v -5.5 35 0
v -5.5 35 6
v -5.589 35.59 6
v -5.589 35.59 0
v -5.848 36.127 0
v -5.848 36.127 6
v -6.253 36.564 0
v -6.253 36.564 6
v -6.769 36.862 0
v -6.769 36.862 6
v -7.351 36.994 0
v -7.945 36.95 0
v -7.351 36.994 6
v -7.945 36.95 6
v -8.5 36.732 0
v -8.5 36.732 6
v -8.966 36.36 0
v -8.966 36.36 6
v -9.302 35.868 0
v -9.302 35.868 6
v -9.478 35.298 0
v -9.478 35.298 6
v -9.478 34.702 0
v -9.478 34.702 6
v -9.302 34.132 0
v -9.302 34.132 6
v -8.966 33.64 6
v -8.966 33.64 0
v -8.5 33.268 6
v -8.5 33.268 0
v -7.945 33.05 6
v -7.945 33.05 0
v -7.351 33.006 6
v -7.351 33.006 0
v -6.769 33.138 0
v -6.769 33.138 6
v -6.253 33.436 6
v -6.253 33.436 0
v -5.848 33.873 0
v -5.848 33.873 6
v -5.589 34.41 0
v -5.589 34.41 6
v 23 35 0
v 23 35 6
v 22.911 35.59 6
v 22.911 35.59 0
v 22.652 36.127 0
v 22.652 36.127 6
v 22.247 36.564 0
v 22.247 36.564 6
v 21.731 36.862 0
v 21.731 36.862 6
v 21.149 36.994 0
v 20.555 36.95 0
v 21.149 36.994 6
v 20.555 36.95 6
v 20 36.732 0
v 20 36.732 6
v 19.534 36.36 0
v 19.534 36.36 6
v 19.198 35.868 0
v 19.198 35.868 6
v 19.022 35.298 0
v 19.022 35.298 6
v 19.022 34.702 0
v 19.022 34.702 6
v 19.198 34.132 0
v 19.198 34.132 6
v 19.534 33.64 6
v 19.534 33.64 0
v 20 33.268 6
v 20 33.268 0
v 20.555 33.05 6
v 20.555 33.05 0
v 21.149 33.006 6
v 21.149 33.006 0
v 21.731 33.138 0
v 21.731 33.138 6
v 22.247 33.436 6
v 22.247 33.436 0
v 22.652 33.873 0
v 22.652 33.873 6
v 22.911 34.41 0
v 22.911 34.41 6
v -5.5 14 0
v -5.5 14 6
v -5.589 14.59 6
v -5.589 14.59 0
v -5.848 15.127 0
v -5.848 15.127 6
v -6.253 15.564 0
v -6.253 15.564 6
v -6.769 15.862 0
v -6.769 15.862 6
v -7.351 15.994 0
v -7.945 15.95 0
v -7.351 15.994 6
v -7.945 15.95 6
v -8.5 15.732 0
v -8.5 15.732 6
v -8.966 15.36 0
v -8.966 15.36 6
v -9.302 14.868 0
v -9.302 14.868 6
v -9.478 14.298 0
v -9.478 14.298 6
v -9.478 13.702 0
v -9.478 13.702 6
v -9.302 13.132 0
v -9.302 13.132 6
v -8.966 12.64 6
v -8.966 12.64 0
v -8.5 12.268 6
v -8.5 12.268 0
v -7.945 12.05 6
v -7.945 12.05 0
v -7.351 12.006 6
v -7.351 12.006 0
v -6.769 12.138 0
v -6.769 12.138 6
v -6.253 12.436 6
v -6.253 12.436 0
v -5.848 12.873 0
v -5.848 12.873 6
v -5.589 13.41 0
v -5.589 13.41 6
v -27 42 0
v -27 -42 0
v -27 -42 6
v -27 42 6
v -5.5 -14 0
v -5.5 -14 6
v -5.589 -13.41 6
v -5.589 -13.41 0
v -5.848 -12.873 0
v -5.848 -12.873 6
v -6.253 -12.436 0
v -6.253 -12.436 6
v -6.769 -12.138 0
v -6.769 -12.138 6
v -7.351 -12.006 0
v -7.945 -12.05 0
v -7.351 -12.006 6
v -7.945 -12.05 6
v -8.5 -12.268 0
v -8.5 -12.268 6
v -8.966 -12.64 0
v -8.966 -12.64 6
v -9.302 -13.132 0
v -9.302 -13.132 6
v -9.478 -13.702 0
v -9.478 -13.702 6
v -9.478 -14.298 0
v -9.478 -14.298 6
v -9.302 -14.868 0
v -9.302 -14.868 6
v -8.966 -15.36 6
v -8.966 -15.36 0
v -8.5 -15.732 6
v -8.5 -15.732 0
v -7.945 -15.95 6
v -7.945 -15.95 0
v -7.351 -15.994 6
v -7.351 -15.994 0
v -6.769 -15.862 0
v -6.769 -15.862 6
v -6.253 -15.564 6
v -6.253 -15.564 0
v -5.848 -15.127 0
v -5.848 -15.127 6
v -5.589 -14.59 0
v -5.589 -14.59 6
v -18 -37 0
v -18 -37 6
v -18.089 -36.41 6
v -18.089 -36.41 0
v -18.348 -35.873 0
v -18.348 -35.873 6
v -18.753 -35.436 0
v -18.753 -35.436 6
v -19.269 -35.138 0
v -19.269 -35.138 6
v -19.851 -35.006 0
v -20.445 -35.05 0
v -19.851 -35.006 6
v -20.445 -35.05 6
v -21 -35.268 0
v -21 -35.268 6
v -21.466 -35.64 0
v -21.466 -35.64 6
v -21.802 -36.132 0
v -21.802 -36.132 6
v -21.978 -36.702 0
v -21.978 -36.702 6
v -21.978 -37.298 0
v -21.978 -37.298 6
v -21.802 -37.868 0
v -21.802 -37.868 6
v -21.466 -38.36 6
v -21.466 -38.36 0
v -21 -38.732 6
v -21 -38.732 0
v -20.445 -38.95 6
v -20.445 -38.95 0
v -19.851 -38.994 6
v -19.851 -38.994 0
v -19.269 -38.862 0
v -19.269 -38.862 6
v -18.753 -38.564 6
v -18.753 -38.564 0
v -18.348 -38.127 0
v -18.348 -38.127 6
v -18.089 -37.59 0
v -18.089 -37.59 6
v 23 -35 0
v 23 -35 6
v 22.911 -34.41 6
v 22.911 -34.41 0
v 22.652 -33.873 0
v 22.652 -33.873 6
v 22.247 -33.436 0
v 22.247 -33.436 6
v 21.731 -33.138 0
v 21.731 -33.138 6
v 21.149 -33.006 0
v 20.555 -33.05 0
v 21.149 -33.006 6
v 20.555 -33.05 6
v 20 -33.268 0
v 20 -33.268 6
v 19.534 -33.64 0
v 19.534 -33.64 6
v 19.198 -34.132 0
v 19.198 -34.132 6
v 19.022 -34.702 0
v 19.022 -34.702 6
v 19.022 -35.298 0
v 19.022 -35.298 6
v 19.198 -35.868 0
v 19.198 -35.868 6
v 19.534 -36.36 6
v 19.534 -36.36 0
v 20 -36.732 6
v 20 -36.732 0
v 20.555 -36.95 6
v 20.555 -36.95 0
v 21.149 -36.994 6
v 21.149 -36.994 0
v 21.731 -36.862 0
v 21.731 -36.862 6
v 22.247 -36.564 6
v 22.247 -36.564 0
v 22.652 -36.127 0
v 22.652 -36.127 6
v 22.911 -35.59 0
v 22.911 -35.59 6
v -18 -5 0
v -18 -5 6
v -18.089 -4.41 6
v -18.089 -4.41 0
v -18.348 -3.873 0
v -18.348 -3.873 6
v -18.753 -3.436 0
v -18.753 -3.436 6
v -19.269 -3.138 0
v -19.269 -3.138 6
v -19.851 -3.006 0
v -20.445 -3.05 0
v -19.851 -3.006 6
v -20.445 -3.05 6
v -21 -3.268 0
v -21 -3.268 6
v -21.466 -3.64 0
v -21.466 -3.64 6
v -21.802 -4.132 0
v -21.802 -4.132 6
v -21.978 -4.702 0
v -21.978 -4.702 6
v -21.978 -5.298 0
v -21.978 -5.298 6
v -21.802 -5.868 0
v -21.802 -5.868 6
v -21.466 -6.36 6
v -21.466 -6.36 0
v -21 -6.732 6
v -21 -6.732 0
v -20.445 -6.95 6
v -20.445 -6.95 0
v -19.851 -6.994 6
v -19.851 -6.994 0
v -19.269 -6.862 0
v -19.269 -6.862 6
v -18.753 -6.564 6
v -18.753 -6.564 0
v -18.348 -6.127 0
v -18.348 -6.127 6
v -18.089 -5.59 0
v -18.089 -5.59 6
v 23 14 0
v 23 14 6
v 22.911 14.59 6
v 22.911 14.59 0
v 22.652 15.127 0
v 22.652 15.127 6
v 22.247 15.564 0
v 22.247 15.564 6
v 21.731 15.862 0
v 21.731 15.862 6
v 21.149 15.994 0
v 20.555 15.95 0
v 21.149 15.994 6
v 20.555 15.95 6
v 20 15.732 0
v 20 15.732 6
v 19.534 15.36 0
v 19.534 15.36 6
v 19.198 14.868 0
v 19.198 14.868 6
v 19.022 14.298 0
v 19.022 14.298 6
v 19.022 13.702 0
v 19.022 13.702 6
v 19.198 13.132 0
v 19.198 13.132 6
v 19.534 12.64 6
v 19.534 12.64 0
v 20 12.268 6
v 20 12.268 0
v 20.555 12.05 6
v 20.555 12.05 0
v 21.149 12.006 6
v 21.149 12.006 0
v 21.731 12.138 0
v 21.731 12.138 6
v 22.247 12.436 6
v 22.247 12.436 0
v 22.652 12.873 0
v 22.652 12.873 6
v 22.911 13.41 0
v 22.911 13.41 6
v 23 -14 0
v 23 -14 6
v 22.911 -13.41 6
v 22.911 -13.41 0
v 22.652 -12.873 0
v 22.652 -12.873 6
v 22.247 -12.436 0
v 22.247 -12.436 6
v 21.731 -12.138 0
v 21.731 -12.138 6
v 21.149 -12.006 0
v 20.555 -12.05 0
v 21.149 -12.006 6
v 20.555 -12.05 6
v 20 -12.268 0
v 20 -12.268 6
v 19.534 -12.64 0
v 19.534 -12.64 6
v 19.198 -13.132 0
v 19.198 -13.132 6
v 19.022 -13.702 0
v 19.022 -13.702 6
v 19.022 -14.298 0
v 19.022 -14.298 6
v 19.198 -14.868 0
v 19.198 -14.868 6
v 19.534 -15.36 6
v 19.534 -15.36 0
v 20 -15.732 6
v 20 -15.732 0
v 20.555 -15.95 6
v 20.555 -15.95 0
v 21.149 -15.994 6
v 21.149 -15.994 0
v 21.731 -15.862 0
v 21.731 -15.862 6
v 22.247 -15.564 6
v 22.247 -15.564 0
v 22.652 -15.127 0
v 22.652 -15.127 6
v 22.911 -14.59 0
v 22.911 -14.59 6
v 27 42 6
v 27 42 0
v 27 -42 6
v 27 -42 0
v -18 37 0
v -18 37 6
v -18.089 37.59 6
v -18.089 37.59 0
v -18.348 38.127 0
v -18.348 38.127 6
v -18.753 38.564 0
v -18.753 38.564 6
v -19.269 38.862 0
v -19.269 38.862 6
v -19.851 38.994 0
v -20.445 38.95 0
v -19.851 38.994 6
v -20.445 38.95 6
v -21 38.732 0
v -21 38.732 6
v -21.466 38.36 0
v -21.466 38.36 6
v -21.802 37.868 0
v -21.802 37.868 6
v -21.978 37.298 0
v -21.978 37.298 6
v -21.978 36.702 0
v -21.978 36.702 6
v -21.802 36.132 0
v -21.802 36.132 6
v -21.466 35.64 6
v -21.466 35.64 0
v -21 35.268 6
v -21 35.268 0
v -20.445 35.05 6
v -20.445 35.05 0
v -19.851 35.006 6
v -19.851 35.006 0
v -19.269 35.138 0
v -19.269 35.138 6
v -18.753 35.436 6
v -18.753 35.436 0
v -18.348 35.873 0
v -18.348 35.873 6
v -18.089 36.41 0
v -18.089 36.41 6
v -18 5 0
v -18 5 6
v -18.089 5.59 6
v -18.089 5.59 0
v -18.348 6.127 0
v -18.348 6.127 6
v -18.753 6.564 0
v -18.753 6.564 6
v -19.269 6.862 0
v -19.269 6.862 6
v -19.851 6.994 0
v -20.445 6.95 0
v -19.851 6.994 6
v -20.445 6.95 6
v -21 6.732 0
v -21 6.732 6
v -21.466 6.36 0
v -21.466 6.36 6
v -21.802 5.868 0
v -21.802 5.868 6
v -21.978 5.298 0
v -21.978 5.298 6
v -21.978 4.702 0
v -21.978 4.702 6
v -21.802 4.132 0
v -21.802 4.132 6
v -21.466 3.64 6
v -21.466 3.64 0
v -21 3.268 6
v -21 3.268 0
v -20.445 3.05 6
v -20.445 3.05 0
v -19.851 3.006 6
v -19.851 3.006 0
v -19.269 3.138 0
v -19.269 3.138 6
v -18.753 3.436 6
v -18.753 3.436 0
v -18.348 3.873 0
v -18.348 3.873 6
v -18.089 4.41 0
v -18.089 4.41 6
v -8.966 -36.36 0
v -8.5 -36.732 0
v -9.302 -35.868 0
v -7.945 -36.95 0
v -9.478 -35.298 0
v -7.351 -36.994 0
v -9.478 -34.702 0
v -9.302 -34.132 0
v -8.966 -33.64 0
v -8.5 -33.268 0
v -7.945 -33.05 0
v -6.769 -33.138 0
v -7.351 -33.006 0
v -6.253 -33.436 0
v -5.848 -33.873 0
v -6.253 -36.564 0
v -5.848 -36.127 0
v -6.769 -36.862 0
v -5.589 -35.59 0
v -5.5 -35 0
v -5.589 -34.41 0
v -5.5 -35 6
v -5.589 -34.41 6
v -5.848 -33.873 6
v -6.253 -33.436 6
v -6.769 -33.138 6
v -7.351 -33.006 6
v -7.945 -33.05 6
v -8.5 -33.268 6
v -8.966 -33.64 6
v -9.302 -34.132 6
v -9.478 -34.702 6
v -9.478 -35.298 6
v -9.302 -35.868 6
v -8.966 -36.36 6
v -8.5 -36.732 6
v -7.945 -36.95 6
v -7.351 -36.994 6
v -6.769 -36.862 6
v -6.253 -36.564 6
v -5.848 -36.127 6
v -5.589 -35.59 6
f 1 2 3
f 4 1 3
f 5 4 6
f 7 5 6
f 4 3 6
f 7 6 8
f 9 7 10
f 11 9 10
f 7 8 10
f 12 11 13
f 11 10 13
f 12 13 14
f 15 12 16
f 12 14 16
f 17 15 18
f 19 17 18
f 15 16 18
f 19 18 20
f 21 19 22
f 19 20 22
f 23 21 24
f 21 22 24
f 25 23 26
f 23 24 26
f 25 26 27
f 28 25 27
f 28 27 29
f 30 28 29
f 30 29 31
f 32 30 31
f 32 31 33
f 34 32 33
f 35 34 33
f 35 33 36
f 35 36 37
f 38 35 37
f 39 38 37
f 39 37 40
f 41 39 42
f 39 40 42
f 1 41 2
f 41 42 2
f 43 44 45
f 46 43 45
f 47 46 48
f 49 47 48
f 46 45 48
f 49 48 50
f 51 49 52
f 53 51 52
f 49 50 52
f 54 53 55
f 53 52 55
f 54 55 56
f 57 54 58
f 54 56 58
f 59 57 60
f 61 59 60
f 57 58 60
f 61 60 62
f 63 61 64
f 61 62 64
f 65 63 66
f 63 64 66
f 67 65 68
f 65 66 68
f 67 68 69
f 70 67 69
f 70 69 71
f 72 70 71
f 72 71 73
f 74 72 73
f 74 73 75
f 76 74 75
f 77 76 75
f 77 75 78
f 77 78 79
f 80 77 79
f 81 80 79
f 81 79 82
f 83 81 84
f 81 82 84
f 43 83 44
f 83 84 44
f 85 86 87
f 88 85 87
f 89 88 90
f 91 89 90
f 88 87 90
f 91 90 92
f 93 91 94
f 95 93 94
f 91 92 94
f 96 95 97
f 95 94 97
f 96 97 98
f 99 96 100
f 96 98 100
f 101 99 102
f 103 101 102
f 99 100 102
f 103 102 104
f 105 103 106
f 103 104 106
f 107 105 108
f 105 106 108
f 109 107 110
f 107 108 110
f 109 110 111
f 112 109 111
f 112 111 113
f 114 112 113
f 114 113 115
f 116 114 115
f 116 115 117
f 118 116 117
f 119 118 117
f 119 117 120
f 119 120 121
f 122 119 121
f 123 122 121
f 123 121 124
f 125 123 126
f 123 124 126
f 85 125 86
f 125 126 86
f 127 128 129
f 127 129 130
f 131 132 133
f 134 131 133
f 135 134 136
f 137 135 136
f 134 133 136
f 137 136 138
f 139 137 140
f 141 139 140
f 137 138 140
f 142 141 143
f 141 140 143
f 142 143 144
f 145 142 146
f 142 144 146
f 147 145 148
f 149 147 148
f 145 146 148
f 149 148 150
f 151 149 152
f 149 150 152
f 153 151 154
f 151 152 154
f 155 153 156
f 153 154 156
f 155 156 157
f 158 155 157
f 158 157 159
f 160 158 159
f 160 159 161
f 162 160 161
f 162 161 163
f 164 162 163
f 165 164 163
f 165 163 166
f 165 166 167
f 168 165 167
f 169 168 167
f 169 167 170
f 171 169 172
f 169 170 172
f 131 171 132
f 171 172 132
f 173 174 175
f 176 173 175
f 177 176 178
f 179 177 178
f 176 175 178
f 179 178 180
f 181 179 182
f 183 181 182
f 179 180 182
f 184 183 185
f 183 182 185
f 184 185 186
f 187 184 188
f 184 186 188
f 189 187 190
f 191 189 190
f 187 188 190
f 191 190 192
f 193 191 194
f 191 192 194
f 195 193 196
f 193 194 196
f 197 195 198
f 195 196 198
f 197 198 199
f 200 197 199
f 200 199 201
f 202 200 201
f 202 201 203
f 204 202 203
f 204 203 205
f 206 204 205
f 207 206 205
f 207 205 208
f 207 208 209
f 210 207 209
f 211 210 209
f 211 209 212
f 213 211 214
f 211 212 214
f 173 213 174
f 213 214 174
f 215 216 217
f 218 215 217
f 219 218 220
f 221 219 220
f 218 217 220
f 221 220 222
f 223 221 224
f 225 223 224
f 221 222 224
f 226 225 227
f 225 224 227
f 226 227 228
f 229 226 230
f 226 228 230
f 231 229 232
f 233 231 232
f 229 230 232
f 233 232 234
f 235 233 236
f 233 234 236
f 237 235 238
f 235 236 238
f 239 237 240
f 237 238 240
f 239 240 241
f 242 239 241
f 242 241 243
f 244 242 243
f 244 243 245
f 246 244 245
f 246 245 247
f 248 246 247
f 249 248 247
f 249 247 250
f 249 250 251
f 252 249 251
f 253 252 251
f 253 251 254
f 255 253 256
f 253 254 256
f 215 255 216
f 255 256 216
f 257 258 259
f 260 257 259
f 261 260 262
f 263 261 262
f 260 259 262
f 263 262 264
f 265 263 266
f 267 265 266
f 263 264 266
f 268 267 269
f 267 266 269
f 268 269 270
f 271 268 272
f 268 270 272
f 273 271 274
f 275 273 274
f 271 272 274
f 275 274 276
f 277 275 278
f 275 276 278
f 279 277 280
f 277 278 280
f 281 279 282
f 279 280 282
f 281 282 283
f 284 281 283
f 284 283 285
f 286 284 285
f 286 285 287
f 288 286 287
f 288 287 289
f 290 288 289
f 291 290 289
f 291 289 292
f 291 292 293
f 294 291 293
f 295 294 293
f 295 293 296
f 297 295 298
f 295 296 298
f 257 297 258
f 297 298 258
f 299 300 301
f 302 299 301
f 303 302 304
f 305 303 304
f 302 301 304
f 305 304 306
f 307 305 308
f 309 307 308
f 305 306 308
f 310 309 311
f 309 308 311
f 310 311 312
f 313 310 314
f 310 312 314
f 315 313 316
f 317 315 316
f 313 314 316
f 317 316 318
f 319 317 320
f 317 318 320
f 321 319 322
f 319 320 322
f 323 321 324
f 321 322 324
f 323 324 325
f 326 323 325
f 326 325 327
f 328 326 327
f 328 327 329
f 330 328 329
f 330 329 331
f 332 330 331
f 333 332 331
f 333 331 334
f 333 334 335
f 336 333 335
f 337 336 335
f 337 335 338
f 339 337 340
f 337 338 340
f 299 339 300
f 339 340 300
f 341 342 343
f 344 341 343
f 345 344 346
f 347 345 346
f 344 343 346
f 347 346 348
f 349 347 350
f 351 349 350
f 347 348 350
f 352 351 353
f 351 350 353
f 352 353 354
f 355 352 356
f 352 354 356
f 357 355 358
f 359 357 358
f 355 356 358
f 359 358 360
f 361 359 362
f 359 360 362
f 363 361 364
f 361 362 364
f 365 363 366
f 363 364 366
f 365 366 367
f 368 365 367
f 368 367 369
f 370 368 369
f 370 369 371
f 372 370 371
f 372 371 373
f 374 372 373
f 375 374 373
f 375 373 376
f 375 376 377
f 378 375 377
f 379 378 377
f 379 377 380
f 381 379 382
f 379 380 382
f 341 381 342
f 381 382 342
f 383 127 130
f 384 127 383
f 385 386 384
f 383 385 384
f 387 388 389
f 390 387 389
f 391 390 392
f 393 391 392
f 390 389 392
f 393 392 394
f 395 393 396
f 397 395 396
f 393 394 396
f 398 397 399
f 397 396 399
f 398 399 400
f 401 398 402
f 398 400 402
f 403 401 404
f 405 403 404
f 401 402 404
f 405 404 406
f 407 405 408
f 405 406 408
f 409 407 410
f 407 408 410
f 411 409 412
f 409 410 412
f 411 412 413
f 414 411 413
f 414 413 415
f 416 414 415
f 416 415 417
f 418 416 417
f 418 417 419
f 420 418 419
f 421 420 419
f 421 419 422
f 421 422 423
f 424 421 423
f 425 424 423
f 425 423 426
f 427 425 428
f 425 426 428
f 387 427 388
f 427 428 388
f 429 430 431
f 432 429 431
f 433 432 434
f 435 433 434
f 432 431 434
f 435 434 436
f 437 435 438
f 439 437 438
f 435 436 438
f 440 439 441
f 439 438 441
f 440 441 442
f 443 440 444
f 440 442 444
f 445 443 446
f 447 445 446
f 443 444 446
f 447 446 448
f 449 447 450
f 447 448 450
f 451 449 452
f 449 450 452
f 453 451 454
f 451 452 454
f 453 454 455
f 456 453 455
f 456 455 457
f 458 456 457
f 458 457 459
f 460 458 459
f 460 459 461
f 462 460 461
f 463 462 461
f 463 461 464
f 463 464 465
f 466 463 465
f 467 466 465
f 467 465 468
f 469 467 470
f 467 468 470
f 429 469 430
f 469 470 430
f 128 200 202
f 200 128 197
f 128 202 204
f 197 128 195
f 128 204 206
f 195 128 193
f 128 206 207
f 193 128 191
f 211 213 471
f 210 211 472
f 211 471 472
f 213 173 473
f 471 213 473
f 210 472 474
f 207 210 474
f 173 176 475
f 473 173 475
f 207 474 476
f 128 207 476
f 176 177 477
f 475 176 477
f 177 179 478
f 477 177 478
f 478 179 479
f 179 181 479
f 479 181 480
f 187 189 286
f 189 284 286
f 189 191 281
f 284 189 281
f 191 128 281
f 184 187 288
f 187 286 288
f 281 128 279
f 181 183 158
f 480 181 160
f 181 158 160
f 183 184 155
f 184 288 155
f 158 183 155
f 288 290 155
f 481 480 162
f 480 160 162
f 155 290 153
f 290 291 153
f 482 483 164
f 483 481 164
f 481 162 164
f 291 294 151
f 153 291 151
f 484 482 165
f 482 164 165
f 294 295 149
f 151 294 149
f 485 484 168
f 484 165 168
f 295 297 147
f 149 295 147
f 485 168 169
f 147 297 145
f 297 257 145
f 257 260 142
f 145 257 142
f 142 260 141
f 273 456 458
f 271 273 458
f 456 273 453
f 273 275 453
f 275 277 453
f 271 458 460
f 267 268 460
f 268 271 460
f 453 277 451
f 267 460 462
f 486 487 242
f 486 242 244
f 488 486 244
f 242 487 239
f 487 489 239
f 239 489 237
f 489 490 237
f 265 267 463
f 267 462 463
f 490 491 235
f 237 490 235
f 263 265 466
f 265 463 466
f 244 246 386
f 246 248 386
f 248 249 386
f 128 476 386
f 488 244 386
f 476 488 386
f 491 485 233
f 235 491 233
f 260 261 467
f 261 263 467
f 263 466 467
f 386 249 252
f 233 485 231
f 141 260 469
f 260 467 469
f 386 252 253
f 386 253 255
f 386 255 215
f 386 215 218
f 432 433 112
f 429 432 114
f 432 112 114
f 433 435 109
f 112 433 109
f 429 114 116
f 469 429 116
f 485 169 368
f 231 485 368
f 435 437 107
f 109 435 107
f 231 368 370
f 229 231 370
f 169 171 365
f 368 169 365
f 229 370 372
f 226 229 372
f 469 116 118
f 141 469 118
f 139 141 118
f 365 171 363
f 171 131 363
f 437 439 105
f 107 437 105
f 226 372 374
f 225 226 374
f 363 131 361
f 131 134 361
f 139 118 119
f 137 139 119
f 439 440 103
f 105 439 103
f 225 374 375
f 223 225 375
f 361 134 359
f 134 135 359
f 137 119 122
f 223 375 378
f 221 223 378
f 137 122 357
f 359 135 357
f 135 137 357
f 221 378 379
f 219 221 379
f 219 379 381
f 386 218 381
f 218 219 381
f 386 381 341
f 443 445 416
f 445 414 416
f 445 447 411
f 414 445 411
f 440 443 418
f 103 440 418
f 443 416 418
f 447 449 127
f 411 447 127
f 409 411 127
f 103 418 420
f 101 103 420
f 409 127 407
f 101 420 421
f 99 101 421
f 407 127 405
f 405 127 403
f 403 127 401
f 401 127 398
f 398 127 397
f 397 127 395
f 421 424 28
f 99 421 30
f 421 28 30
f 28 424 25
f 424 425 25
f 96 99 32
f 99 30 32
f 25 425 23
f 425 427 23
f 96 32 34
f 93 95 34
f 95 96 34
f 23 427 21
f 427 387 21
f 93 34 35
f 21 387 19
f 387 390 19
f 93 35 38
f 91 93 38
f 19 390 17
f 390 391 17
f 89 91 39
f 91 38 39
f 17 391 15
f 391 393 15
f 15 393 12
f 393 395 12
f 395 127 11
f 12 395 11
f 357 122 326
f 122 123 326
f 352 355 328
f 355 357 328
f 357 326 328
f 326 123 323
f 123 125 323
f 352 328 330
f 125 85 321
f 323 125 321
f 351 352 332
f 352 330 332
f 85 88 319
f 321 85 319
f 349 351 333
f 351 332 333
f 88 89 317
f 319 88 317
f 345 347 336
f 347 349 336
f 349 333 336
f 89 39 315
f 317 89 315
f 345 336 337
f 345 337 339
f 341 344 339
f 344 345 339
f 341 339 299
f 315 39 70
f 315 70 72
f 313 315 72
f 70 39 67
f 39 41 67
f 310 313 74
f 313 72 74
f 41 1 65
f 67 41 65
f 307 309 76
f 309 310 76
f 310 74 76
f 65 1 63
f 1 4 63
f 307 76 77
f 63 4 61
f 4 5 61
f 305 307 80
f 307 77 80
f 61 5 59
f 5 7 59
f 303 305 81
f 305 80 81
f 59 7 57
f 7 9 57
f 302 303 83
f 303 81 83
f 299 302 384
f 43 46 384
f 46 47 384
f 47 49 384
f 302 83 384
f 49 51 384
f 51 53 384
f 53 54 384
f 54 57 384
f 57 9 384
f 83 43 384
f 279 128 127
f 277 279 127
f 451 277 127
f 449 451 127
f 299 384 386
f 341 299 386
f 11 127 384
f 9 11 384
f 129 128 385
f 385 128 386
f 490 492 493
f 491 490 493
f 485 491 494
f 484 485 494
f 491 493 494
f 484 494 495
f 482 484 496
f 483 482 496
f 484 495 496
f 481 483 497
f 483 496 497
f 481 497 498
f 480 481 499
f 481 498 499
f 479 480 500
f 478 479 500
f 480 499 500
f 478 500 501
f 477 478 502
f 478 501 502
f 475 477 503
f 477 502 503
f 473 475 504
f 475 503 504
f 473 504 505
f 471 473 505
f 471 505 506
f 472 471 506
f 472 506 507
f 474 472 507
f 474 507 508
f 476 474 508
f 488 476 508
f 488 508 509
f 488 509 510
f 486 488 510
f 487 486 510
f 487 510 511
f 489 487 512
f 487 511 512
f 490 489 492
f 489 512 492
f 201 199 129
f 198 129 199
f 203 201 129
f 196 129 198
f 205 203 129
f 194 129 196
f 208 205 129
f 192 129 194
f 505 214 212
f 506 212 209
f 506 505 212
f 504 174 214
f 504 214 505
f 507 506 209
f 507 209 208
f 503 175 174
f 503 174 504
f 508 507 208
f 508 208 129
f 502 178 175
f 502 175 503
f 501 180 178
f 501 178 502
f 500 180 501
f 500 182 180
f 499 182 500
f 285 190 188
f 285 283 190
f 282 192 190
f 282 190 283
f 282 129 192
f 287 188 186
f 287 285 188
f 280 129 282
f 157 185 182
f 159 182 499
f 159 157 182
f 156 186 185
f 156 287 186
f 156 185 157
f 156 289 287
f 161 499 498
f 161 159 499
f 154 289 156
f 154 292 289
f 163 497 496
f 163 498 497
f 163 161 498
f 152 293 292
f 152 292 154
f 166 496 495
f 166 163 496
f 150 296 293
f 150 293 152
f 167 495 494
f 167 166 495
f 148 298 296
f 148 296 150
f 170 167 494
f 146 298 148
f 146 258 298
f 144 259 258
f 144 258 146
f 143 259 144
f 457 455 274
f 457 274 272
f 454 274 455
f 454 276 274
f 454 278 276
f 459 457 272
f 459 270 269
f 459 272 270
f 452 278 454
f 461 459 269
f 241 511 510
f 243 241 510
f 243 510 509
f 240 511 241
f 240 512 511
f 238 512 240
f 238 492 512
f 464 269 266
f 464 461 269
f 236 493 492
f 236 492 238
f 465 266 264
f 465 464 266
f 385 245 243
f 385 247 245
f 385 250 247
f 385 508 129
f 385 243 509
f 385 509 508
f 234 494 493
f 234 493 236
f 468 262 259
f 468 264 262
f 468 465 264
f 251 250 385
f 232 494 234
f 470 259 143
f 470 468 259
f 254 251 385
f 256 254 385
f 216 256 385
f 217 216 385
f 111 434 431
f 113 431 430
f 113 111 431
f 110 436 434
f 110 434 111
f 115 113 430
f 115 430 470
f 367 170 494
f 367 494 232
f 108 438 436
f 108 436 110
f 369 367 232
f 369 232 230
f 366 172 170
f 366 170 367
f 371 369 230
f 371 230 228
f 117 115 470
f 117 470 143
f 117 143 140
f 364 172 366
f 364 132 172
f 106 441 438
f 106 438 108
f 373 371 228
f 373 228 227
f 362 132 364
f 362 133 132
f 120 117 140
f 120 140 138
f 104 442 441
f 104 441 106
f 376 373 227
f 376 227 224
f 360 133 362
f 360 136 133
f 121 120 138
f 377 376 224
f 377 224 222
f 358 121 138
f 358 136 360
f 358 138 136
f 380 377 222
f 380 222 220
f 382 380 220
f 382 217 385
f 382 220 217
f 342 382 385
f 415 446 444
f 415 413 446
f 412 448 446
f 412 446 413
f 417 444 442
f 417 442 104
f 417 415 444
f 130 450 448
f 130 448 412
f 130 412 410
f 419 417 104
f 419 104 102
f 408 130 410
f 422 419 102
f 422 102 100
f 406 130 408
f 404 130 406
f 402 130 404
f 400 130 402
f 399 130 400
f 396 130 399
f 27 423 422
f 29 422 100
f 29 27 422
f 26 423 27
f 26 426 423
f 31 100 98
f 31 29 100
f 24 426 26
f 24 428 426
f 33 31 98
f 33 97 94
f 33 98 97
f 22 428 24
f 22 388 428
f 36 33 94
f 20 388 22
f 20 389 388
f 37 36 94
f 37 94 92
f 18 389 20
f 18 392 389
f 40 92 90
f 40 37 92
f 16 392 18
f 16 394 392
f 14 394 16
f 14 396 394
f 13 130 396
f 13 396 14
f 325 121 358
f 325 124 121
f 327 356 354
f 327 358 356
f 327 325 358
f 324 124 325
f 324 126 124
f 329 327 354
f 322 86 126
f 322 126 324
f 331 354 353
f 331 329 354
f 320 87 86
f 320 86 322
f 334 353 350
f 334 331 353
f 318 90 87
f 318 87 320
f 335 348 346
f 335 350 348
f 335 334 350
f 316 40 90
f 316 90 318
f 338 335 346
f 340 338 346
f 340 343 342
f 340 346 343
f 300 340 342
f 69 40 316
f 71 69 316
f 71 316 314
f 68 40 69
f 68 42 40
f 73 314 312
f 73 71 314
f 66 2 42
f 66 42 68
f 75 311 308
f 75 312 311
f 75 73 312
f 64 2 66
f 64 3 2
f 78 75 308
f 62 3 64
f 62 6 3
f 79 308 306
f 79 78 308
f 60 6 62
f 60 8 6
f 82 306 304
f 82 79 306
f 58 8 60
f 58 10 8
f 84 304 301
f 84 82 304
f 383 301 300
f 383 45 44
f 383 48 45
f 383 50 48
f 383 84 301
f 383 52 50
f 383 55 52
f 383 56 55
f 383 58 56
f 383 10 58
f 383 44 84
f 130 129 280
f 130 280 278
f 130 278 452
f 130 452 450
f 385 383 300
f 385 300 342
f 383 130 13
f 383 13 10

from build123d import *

# Parameters (mm, degrees)
F0_W     = 54
F0_H     = 84
F1_DEPTH = 6
F3_R     = 2
F4_DEPTH = 6


with BuildPart() as f1:
    # F0 (on Top) → F1 (new body)
    with BuildSketch(Plane.XY):
        Rectangle(F0_W, F0_H)
    extrude(amount=F1_DEPTH)

    # F3 (on face) → F4 (cut, through all)
    with BuildSketch(Plane.XY.offset(6)):
        with Locations((-7.5, 14)):
            Circle(F3_R)
        with Locations((-7.5, -14)):
            Circle(F3_R)
        with Locations((-20, 5)):
            Circle(F3_R)
        with Locations((-20, -5)):
            Circle(F3_R)
        with Locations((21, 14)):
            Circle(F3_R)
        with Locations((21, -14)):
            Circle(F3_R)
        with Locations((21, -35)):
            Circle(F3_R)
        with Locations((21, 35)):
            Circle(F3_R)
        with Locations((-20, 37)):
            Circle(F3_R)
        with Locations((-7.5, 35)):
            Circle(F3_R)
        with Locations((-20, -37)):
            Circle(F3_R)
        with Locations((-7.5, -35)):
            Circle(F3_R)
    extrude(amount=-F4_DEPTH, mode=Mode.SUBTRACT)


solid = f1.part
